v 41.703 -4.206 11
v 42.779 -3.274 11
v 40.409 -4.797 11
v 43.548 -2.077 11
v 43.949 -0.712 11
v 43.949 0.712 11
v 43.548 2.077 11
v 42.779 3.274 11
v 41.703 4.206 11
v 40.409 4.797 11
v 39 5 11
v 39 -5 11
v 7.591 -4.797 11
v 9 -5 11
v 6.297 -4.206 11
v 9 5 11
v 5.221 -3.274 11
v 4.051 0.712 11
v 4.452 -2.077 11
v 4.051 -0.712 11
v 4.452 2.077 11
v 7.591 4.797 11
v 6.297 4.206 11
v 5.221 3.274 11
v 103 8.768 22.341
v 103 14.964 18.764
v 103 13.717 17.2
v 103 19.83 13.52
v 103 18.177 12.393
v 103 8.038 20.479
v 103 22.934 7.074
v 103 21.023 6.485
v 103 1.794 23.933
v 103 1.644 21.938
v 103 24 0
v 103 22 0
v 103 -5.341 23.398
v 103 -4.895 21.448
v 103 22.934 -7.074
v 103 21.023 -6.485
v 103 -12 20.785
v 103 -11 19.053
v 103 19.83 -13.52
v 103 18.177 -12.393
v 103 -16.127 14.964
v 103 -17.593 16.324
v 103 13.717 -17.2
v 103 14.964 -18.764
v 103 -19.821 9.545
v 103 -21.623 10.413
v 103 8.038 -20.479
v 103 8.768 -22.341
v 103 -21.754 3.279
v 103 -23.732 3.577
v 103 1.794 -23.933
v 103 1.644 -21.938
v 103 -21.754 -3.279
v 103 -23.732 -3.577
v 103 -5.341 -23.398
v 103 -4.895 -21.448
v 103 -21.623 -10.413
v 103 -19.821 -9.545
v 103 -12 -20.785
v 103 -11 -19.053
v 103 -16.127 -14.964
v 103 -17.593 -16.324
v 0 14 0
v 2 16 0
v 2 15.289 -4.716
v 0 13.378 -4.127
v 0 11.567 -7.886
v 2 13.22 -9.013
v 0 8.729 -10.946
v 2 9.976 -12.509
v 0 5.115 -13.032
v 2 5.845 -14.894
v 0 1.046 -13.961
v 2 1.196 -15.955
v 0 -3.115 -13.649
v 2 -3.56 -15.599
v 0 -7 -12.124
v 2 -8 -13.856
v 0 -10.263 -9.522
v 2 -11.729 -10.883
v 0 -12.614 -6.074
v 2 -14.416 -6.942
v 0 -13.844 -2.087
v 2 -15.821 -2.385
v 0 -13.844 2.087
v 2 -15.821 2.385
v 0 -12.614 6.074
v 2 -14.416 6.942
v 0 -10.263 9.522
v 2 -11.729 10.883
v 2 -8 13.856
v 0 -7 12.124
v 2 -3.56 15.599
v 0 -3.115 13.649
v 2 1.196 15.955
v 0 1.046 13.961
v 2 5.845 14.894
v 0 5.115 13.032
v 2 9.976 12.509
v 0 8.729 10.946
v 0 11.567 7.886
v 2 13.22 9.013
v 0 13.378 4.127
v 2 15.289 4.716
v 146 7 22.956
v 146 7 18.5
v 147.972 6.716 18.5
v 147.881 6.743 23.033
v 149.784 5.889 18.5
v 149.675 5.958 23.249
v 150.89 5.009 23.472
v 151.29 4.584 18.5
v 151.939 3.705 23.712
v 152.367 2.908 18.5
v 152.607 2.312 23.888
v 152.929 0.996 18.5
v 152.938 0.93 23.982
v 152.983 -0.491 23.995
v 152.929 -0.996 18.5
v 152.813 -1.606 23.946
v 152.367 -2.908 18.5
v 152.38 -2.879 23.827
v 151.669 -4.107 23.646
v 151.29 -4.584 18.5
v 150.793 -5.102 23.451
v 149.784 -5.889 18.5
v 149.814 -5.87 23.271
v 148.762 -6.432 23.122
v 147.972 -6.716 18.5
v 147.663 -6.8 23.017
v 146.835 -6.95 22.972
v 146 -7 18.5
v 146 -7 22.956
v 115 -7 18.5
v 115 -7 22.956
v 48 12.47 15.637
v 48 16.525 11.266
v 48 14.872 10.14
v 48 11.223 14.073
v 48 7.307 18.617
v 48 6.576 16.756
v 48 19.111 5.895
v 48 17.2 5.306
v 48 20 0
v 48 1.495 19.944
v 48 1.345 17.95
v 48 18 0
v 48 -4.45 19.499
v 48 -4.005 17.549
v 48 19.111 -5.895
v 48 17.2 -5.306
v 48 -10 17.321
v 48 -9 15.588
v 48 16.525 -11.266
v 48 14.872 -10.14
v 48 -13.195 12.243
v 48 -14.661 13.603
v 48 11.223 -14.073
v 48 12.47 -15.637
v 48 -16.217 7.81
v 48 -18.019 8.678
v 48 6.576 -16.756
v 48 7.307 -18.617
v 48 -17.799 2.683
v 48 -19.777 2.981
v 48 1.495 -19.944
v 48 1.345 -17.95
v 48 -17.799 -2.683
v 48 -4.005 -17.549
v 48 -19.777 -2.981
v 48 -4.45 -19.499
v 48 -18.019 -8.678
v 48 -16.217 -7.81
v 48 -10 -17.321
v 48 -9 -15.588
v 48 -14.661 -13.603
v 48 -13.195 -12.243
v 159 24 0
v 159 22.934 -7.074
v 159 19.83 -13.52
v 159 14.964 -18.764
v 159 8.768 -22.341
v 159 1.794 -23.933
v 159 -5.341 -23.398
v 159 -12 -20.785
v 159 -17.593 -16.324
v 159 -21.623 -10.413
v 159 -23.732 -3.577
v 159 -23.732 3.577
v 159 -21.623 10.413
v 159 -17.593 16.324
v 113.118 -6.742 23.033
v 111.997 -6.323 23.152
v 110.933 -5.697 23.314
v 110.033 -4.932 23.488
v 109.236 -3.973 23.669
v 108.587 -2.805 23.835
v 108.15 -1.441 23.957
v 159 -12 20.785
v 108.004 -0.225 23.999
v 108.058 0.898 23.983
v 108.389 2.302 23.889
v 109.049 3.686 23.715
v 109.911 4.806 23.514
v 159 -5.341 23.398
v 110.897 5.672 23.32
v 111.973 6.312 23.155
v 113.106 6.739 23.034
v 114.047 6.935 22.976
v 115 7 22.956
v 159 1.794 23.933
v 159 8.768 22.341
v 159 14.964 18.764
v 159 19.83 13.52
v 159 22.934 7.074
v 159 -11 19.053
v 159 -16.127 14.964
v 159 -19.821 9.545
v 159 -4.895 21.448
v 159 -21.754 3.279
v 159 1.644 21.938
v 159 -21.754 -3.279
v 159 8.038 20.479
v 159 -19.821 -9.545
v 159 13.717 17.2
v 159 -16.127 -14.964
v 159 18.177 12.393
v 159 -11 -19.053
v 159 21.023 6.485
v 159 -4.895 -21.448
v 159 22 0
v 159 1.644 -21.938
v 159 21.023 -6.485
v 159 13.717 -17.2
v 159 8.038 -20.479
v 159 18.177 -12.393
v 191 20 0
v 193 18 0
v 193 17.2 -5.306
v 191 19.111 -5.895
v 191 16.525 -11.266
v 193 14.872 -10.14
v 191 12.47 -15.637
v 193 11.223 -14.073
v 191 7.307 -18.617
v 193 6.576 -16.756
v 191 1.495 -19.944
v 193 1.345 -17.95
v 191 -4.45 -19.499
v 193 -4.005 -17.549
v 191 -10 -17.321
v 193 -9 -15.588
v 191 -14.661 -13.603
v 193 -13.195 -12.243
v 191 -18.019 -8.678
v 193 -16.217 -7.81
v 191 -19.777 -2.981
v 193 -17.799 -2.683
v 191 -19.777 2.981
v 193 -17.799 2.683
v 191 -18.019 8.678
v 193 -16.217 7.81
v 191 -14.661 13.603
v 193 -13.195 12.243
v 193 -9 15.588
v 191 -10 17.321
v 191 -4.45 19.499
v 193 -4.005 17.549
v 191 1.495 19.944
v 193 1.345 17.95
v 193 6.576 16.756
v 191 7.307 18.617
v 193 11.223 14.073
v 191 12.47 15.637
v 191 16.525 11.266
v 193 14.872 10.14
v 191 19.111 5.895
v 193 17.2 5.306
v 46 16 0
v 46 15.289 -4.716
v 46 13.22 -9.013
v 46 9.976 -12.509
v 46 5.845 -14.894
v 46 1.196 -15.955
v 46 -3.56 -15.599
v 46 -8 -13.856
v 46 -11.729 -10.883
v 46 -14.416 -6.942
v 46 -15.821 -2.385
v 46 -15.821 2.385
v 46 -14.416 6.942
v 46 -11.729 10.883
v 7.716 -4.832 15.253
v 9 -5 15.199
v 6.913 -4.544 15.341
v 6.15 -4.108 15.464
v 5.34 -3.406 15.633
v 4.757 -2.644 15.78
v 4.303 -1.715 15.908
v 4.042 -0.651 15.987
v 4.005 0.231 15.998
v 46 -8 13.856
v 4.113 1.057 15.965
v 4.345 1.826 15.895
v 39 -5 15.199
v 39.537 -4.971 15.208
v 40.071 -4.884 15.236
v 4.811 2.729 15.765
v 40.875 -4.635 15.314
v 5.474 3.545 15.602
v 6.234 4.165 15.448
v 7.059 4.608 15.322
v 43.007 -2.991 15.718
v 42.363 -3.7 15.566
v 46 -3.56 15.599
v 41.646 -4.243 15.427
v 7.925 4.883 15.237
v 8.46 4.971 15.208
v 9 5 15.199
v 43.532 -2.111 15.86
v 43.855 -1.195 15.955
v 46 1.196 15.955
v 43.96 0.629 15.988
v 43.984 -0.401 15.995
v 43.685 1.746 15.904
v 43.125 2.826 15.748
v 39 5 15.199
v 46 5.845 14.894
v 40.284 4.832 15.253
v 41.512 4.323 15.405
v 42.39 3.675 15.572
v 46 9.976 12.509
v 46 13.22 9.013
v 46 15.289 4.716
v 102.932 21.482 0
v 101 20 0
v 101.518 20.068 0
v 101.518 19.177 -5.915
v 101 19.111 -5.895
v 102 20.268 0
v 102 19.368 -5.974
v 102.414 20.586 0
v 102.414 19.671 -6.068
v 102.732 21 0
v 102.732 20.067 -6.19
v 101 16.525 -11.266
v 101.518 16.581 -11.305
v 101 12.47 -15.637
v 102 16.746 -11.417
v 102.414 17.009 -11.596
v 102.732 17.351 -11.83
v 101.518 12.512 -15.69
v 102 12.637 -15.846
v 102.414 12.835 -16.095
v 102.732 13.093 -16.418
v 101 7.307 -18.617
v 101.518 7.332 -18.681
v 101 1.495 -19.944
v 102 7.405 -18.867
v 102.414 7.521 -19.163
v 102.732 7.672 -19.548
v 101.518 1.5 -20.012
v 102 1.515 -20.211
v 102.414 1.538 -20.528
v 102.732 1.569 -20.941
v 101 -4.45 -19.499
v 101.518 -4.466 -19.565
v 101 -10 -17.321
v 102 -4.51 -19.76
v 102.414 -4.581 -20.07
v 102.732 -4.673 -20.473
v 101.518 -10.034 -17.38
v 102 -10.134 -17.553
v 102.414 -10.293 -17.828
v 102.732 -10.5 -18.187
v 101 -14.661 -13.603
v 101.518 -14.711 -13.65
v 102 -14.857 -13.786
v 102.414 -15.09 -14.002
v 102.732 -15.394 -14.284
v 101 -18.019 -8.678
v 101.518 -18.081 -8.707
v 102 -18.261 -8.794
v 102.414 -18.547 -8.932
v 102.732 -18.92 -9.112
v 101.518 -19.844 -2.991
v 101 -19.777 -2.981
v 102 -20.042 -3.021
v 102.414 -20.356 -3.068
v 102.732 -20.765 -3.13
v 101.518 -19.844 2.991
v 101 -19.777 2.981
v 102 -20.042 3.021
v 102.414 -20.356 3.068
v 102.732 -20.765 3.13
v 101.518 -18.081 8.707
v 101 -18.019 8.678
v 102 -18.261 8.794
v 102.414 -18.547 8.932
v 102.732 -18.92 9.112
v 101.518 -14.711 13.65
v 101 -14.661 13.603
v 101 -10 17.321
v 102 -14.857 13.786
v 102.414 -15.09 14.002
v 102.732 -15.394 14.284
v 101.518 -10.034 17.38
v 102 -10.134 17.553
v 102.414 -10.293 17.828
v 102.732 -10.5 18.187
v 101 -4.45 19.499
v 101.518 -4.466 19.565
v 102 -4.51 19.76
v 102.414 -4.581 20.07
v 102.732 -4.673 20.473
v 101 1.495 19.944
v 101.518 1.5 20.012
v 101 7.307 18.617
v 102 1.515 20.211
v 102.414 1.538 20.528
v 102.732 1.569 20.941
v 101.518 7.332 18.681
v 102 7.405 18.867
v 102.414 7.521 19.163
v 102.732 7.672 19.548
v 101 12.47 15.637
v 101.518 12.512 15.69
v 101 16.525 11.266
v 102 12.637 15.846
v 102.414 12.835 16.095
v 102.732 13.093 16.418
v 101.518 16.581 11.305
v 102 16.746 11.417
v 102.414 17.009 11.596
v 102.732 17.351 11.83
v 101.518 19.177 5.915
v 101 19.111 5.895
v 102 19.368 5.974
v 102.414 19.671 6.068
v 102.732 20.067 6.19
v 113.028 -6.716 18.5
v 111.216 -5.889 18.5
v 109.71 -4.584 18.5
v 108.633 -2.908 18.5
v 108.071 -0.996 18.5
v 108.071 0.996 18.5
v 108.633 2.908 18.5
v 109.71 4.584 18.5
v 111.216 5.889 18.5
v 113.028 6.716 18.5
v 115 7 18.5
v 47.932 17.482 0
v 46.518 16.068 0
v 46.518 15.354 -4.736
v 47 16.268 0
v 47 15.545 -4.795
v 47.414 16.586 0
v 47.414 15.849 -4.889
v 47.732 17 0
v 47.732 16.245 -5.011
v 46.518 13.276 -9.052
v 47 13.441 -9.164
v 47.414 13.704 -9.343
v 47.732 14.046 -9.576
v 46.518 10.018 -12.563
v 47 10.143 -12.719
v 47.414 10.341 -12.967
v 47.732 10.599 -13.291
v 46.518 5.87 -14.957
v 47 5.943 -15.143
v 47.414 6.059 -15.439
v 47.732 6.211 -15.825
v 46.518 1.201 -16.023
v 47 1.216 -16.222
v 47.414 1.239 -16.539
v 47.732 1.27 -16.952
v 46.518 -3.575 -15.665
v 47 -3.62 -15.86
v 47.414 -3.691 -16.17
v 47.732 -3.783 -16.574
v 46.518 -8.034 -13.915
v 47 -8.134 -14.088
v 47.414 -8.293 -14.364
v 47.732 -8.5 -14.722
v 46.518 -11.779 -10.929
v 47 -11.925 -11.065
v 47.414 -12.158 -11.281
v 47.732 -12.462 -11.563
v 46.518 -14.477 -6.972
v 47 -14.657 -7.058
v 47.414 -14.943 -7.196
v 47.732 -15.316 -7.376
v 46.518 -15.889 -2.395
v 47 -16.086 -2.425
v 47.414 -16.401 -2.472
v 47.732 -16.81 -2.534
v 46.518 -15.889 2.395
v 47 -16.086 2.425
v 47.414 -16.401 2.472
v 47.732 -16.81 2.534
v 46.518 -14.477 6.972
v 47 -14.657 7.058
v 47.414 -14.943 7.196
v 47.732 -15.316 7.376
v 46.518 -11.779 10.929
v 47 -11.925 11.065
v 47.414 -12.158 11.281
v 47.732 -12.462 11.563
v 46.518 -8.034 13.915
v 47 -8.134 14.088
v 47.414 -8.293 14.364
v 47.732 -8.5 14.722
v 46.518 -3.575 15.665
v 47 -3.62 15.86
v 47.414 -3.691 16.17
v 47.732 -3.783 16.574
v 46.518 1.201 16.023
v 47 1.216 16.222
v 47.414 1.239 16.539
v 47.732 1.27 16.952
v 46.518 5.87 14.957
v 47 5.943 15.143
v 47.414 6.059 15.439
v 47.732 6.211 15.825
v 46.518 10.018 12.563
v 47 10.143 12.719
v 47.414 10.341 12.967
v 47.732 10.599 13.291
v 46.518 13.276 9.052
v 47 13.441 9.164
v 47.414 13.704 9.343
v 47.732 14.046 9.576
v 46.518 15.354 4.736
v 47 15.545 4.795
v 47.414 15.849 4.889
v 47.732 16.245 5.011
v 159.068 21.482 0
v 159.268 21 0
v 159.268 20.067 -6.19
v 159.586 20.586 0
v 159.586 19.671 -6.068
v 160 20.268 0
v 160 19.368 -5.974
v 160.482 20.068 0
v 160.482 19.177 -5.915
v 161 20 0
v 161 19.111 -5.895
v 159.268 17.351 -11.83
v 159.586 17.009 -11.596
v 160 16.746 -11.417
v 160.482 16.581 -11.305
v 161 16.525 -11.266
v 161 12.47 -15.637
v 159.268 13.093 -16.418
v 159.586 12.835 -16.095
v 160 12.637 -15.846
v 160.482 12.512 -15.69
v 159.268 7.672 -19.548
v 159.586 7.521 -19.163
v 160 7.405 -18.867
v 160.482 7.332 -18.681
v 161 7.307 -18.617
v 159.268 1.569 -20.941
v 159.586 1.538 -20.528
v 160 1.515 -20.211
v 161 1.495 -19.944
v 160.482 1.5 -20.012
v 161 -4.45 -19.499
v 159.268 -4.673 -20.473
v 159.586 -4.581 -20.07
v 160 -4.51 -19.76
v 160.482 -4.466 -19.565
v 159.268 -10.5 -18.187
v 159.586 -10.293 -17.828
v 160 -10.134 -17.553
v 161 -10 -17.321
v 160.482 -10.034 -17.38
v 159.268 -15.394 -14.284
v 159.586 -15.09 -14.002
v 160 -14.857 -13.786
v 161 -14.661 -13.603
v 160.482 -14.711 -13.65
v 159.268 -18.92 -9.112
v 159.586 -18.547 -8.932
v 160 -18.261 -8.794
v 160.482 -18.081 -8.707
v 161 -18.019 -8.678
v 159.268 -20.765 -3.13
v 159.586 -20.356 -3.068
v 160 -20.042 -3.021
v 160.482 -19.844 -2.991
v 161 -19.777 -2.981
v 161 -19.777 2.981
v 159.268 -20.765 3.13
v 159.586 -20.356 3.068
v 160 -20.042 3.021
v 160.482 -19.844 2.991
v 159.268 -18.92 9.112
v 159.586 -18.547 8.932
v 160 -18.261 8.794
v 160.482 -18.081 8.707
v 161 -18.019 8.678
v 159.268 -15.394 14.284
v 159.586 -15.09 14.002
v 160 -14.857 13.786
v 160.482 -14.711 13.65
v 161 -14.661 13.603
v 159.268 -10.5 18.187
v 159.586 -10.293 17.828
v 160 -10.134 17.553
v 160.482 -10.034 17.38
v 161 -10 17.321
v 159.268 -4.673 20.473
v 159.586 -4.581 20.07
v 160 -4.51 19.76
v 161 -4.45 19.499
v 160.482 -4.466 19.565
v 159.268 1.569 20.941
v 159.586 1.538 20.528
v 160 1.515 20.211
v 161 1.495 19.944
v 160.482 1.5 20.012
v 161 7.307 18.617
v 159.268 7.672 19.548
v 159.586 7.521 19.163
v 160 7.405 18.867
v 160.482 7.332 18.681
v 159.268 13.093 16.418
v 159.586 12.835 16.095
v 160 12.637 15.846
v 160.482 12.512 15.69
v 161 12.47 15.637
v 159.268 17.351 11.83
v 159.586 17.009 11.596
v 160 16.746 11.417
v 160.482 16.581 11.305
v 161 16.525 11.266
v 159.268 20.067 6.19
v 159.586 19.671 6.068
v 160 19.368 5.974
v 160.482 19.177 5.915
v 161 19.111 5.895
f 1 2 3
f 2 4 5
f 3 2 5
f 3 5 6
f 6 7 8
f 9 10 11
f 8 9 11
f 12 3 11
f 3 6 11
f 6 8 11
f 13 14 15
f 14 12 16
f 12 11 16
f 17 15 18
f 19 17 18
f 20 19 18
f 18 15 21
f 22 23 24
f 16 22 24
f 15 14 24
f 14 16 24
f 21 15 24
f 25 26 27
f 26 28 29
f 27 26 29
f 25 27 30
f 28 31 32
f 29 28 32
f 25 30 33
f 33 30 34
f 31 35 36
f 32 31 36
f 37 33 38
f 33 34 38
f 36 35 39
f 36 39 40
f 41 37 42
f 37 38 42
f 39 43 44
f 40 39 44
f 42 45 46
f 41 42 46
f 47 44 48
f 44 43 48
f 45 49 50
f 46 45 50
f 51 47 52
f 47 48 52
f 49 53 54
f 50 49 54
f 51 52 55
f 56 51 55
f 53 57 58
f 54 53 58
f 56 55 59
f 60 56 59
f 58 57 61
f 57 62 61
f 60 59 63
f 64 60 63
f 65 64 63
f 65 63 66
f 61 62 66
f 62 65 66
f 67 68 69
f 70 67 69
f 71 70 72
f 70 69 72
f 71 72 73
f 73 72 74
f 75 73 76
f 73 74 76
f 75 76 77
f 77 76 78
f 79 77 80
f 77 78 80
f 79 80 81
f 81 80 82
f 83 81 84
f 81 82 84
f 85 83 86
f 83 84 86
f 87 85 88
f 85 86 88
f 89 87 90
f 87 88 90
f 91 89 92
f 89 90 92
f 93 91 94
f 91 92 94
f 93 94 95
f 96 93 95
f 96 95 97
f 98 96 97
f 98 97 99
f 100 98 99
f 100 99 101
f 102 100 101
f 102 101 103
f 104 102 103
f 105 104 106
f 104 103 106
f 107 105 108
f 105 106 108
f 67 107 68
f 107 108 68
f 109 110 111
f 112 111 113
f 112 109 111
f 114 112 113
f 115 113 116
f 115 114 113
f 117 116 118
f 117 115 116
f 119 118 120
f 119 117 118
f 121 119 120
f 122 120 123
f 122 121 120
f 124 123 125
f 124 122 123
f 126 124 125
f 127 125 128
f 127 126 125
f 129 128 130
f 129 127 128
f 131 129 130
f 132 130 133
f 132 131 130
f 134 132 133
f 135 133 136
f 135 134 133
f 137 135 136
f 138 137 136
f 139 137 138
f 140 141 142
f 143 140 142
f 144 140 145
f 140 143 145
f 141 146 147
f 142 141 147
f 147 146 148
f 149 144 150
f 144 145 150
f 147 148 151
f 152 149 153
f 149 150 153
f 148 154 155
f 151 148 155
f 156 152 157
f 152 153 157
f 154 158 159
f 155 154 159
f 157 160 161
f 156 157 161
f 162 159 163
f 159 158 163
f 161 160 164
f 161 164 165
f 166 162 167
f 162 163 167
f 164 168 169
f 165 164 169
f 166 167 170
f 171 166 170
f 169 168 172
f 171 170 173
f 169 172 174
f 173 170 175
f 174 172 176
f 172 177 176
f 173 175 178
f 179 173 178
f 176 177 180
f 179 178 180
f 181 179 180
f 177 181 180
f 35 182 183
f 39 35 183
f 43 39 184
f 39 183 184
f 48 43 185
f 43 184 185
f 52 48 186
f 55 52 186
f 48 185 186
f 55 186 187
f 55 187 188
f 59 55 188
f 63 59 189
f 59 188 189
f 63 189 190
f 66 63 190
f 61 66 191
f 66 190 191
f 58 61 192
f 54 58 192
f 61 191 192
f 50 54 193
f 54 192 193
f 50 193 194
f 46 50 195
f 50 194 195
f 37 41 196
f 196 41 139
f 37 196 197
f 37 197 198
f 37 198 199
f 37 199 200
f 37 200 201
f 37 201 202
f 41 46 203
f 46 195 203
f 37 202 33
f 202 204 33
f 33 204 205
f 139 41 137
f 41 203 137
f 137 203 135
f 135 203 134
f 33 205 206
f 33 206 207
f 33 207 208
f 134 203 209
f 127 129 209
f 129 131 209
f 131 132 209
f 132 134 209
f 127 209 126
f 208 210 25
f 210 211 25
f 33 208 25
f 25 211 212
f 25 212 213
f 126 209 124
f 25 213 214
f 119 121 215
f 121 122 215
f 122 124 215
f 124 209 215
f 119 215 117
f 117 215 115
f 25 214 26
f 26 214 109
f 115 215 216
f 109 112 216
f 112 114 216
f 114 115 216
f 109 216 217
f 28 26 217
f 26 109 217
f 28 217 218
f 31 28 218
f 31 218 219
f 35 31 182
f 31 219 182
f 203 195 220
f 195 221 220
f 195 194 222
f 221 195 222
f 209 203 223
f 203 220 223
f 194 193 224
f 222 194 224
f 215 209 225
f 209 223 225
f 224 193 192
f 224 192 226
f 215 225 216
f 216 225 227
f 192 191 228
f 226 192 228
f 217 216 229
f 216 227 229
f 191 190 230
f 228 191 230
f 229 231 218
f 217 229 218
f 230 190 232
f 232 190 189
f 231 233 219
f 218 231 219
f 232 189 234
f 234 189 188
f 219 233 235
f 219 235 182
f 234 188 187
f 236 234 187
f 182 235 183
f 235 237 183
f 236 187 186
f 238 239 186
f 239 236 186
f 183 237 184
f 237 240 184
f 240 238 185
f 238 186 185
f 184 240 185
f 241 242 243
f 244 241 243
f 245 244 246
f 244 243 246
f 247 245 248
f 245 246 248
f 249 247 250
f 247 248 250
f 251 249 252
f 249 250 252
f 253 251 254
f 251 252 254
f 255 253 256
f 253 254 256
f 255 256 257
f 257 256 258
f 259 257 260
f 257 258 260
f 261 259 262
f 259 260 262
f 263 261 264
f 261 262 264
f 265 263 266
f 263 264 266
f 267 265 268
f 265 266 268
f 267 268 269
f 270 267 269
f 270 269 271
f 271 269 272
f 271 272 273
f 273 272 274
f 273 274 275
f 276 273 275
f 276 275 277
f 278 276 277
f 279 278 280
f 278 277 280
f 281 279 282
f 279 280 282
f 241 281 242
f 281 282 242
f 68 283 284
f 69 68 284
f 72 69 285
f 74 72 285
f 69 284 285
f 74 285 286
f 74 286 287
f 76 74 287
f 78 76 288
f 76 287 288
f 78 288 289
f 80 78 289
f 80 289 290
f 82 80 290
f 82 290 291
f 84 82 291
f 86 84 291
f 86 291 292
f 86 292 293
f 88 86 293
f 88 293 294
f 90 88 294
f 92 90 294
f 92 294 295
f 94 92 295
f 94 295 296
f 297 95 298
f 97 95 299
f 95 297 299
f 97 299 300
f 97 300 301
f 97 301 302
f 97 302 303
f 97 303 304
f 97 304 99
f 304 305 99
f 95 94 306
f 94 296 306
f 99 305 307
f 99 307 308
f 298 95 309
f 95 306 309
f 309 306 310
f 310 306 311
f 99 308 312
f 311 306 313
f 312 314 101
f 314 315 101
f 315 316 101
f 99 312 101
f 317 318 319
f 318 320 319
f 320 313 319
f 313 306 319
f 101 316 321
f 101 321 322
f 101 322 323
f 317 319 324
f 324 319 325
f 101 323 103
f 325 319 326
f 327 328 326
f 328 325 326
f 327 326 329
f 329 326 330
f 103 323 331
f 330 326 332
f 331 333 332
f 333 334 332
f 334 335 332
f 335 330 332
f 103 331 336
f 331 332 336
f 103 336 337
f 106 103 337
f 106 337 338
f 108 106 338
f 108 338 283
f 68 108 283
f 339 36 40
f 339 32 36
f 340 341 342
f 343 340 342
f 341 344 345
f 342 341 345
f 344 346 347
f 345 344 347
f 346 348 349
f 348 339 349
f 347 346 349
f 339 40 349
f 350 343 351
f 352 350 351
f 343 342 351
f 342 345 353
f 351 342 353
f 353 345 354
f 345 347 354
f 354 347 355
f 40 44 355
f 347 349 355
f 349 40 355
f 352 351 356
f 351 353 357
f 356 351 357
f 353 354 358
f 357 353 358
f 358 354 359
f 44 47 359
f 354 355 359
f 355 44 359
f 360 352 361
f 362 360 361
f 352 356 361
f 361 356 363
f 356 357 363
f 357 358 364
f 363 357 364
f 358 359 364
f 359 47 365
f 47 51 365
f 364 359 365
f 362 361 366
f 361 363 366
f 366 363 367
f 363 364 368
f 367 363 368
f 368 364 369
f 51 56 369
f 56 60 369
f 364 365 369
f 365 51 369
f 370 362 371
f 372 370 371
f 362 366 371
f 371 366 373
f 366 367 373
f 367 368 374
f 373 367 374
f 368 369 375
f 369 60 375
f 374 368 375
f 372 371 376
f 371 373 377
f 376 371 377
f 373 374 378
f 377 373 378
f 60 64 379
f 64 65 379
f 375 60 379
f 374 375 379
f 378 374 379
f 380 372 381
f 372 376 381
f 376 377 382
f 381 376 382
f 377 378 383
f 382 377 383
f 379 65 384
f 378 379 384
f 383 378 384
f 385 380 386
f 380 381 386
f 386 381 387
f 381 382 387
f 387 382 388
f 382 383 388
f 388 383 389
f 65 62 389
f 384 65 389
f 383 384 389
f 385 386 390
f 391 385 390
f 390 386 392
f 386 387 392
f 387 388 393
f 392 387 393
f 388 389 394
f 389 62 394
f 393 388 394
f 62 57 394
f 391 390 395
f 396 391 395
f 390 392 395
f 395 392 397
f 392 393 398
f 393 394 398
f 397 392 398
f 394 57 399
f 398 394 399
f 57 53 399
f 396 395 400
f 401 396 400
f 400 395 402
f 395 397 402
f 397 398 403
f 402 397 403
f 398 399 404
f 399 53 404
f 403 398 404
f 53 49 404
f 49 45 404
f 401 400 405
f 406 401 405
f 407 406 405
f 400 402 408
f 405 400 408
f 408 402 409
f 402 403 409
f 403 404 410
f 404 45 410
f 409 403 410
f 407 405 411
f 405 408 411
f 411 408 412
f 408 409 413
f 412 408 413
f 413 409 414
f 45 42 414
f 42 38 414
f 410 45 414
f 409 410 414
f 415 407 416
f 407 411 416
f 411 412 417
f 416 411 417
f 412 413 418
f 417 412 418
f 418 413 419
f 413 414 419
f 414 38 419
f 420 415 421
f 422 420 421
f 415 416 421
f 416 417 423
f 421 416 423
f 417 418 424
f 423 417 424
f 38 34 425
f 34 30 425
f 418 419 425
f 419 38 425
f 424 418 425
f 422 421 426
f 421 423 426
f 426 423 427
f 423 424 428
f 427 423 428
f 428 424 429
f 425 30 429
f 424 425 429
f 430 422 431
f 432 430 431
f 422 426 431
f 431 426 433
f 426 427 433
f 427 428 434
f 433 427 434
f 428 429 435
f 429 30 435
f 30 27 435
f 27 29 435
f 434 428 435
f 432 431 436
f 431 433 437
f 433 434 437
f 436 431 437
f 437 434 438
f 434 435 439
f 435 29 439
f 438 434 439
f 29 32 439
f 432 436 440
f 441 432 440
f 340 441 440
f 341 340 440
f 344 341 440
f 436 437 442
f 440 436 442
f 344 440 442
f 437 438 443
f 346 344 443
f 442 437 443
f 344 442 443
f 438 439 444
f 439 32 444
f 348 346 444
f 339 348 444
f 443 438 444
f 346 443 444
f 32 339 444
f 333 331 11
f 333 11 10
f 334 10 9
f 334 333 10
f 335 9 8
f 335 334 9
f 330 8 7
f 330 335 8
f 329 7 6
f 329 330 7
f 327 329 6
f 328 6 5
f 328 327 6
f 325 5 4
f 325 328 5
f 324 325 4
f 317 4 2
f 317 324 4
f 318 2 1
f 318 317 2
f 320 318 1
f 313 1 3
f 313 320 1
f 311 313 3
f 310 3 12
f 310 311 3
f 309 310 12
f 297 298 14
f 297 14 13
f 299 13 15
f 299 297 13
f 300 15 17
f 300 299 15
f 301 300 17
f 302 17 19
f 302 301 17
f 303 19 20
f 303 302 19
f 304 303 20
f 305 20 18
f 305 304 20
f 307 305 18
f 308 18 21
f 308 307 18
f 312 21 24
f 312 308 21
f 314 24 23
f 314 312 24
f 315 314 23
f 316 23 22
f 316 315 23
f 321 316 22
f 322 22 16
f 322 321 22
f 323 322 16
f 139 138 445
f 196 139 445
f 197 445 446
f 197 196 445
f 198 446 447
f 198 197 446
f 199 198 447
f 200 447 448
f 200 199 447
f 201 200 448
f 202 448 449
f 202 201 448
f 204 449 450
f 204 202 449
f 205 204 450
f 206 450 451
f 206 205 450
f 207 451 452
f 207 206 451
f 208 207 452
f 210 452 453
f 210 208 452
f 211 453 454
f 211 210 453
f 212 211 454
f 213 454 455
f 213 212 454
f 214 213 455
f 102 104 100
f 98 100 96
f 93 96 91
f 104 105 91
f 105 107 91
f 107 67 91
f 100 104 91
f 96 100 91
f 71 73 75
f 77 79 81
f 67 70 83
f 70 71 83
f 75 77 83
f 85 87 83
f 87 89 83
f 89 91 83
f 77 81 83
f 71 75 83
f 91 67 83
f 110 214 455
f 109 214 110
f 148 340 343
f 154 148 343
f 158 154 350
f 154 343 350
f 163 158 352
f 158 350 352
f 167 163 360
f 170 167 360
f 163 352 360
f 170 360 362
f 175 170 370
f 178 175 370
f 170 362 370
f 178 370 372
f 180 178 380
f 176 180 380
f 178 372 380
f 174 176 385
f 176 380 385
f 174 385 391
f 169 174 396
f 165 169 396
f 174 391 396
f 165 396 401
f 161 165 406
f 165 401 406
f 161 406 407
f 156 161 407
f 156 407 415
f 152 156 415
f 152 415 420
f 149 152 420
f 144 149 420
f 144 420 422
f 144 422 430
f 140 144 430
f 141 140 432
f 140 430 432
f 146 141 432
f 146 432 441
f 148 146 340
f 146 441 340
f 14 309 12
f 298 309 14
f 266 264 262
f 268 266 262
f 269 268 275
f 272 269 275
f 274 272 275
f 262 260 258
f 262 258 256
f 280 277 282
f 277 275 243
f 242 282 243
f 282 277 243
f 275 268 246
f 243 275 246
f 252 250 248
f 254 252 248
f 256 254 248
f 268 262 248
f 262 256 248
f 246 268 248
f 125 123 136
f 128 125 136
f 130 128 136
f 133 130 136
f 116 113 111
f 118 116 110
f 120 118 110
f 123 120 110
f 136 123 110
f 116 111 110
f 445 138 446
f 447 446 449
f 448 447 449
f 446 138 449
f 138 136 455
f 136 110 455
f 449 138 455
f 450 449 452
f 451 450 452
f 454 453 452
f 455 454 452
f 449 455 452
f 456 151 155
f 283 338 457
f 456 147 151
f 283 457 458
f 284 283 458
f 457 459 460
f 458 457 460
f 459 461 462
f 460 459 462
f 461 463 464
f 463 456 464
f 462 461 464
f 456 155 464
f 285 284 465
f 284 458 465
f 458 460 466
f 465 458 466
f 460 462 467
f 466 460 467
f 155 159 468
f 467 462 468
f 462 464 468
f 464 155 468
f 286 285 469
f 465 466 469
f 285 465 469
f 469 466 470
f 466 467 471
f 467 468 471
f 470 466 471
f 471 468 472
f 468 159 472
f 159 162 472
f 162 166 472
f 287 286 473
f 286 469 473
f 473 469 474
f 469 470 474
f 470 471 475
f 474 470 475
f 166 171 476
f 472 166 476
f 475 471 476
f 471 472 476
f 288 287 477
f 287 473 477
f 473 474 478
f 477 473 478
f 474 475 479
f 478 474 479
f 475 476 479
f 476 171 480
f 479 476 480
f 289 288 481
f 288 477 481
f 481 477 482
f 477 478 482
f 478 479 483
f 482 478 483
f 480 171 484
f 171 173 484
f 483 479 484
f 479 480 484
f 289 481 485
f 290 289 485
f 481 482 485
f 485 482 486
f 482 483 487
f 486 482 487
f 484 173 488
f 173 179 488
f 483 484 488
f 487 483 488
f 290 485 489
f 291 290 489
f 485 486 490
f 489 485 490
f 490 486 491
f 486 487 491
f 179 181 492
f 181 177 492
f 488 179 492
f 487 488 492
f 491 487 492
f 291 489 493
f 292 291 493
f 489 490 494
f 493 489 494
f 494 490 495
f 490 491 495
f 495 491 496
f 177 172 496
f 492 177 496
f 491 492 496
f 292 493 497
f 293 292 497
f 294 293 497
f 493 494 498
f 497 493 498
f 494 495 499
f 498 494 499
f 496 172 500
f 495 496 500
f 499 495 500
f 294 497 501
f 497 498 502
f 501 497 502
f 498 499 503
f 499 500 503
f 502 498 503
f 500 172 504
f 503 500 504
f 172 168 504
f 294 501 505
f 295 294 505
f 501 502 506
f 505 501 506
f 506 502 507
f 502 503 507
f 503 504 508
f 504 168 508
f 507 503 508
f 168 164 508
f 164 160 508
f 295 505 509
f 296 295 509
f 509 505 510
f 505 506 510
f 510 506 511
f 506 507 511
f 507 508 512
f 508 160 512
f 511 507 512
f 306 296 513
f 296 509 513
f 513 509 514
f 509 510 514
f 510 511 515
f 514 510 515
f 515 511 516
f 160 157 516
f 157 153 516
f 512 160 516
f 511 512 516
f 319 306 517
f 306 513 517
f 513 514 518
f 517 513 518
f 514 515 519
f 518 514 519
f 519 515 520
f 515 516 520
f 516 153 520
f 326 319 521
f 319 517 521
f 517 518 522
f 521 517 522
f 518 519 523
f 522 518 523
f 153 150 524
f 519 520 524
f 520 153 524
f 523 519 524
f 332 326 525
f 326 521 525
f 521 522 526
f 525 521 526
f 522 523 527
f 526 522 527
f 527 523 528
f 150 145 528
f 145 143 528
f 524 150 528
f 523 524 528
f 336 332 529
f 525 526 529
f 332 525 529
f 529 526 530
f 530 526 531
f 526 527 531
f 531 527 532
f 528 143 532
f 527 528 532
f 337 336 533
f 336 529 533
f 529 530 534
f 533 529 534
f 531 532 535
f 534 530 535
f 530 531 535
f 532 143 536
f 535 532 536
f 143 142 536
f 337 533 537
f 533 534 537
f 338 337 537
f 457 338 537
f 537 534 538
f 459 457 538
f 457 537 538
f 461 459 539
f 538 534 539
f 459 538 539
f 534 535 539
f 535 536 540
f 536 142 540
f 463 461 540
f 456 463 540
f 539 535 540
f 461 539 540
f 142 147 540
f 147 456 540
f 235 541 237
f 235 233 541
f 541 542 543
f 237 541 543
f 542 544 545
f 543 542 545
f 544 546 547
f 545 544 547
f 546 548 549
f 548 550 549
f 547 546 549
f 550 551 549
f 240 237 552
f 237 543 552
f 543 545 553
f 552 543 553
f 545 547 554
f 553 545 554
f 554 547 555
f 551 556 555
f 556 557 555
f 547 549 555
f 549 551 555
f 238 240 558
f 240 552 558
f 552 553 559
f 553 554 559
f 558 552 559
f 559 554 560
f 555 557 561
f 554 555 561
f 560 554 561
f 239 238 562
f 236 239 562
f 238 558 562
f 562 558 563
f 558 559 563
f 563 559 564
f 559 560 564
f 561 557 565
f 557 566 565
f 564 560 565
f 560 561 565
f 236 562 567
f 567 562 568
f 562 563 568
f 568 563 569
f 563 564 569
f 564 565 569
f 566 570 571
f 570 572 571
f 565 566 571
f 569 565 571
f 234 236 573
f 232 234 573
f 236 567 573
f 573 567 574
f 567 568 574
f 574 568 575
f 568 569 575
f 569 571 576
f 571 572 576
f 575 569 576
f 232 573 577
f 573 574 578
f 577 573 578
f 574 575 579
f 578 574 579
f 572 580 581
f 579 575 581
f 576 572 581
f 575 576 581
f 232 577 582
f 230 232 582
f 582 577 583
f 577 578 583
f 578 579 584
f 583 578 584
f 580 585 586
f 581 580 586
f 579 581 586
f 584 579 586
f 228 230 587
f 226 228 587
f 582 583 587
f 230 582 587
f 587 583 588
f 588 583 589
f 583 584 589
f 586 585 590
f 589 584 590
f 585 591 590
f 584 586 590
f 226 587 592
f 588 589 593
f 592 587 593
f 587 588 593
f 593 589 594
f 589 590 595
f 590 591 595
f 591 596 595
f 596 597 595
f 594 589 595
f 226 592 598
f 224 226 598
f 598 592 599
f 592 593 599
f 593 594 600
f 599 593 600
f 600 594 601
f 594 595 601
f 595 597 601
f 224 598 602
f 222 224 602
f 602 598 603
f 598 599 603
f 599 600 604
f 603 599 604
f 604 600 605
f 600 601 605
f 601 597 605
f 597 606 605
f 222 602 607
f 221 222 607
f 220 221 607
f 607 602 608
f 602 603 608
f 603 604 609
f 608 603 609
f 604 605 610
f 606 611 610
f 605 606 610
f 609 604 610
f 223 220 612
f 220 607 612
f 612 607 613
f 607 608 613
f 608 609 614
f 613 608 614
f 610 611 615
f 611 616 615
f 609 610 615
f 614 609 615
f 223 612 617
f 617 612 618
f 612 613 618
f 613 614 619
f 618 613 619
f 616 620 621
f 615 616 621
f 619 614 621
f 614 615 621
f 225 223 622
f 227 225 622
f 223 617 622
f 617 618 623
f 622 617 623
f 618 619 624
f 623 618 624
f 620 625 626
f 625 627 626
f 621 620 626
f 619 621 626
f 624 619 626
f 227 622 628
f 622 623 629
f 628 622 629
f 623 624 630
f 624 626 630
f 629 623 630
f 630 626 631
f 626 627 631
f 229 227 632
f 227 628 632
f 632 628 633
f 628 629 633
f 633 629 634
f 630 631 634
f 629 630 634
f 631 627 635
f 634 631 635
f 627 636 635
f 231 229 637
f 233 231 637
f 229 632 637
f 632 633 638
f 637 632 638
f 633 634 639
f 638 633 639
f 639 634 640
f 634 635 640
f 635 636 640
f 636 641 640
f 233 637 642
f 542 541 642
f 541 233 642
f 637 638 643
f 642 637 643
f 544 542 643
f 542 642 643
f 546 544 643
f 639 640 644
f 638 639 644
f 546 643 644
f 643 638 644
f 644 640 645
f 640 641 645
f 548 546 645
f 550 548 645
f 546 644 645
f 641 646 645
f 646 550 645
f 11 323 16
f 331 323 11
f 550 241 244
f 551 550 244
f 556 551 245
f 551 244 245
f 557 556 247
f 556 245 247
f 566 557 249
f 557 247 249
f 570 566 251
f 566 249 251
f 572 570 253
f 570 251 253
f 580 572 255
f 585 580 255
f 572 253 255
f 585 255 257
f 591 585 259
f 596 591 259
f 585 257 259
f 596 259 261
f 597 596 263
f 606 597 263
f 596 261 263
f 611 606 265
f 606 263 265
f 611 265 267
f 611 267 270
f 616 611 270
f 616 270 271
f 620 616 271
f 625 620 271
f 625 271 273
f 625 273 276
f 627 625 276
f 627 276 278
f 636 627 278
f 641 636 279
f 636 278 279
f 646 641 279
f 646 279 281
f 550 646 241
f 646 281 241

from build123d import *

# Parameters (mm, degrees)
CHAMFER_1_SIZE      = 2
FILLET_1_R          = 2
CUT_EXTRUDE_1_DEPTH = 5
CUT_EXTRUDE_2_DEPTH = 5.5


with BuildPart() as part:
    # Эскиз1 → Повернуть1 (revolve)
    with BuildSketch(Plane.XY):
        Polygon((0, 0), (0, 16), (48, 16), (48, 20), (103, 20), (103, 24), (159, 24), (159, 20), (193, 20), (193, 0), align=None)
    revolve(axis=Axis((193, 0, 0), (-1, 0, 0)))

    # Фаска1
    chamfer_1_edges = [part.edges().sort_by_distance(p)[0] for p in [
        (0, -16, 0),
        (193, -20, 0),
    ]]
    chamfer(chamfer_1_edges, length=CHAMFER_1_SIZE)

    # Скругление1
    fillet_1_edges = [part.edges().sort_by_distance(p)[0] for p in [
        (48, -16, 0),
        (159, -20, 0),
        (103, -20, 0),
    ]]
    fillet(fillet_1_edges, radius=FILLET_1_R)

    # Эскиз2 → Вырез-Вытянуть1 (cut)
    with BuildSketch(Plane.XY.offset(16)):
        with BuildLine():
            Line((9, 5), (39, 5))
            ThreePointArc((39, 5), (44, 0), (39, -5))
            Line((39, -5), (9, -5))
            ThreePointArc((9, -5), (4, 0), (9, 5))
        make_face()
    extrude(amount=-CUT_EXTRUDE_1_DEPTH, mode=Mode.SUBTRACT)

    # Эскиз3 → Вырез-Вытянуть2 (cut)
    with BuildSketch(Plane.XY.offset(24)):
        with BuildLine():
            Line((115, 7), (146, 7))
            ThreePointArc((146, 7), (153, 0), (146, -7))
            Line((146, -7), (115, -7))
            ThreePointArc((115, -7), (108, 0), (115, 7))
        make_face()
    extrude(amount=-CUT_EXTRUDE_2_DEPTH, mode=Mode.SUBTRACT)


solid = part.part
